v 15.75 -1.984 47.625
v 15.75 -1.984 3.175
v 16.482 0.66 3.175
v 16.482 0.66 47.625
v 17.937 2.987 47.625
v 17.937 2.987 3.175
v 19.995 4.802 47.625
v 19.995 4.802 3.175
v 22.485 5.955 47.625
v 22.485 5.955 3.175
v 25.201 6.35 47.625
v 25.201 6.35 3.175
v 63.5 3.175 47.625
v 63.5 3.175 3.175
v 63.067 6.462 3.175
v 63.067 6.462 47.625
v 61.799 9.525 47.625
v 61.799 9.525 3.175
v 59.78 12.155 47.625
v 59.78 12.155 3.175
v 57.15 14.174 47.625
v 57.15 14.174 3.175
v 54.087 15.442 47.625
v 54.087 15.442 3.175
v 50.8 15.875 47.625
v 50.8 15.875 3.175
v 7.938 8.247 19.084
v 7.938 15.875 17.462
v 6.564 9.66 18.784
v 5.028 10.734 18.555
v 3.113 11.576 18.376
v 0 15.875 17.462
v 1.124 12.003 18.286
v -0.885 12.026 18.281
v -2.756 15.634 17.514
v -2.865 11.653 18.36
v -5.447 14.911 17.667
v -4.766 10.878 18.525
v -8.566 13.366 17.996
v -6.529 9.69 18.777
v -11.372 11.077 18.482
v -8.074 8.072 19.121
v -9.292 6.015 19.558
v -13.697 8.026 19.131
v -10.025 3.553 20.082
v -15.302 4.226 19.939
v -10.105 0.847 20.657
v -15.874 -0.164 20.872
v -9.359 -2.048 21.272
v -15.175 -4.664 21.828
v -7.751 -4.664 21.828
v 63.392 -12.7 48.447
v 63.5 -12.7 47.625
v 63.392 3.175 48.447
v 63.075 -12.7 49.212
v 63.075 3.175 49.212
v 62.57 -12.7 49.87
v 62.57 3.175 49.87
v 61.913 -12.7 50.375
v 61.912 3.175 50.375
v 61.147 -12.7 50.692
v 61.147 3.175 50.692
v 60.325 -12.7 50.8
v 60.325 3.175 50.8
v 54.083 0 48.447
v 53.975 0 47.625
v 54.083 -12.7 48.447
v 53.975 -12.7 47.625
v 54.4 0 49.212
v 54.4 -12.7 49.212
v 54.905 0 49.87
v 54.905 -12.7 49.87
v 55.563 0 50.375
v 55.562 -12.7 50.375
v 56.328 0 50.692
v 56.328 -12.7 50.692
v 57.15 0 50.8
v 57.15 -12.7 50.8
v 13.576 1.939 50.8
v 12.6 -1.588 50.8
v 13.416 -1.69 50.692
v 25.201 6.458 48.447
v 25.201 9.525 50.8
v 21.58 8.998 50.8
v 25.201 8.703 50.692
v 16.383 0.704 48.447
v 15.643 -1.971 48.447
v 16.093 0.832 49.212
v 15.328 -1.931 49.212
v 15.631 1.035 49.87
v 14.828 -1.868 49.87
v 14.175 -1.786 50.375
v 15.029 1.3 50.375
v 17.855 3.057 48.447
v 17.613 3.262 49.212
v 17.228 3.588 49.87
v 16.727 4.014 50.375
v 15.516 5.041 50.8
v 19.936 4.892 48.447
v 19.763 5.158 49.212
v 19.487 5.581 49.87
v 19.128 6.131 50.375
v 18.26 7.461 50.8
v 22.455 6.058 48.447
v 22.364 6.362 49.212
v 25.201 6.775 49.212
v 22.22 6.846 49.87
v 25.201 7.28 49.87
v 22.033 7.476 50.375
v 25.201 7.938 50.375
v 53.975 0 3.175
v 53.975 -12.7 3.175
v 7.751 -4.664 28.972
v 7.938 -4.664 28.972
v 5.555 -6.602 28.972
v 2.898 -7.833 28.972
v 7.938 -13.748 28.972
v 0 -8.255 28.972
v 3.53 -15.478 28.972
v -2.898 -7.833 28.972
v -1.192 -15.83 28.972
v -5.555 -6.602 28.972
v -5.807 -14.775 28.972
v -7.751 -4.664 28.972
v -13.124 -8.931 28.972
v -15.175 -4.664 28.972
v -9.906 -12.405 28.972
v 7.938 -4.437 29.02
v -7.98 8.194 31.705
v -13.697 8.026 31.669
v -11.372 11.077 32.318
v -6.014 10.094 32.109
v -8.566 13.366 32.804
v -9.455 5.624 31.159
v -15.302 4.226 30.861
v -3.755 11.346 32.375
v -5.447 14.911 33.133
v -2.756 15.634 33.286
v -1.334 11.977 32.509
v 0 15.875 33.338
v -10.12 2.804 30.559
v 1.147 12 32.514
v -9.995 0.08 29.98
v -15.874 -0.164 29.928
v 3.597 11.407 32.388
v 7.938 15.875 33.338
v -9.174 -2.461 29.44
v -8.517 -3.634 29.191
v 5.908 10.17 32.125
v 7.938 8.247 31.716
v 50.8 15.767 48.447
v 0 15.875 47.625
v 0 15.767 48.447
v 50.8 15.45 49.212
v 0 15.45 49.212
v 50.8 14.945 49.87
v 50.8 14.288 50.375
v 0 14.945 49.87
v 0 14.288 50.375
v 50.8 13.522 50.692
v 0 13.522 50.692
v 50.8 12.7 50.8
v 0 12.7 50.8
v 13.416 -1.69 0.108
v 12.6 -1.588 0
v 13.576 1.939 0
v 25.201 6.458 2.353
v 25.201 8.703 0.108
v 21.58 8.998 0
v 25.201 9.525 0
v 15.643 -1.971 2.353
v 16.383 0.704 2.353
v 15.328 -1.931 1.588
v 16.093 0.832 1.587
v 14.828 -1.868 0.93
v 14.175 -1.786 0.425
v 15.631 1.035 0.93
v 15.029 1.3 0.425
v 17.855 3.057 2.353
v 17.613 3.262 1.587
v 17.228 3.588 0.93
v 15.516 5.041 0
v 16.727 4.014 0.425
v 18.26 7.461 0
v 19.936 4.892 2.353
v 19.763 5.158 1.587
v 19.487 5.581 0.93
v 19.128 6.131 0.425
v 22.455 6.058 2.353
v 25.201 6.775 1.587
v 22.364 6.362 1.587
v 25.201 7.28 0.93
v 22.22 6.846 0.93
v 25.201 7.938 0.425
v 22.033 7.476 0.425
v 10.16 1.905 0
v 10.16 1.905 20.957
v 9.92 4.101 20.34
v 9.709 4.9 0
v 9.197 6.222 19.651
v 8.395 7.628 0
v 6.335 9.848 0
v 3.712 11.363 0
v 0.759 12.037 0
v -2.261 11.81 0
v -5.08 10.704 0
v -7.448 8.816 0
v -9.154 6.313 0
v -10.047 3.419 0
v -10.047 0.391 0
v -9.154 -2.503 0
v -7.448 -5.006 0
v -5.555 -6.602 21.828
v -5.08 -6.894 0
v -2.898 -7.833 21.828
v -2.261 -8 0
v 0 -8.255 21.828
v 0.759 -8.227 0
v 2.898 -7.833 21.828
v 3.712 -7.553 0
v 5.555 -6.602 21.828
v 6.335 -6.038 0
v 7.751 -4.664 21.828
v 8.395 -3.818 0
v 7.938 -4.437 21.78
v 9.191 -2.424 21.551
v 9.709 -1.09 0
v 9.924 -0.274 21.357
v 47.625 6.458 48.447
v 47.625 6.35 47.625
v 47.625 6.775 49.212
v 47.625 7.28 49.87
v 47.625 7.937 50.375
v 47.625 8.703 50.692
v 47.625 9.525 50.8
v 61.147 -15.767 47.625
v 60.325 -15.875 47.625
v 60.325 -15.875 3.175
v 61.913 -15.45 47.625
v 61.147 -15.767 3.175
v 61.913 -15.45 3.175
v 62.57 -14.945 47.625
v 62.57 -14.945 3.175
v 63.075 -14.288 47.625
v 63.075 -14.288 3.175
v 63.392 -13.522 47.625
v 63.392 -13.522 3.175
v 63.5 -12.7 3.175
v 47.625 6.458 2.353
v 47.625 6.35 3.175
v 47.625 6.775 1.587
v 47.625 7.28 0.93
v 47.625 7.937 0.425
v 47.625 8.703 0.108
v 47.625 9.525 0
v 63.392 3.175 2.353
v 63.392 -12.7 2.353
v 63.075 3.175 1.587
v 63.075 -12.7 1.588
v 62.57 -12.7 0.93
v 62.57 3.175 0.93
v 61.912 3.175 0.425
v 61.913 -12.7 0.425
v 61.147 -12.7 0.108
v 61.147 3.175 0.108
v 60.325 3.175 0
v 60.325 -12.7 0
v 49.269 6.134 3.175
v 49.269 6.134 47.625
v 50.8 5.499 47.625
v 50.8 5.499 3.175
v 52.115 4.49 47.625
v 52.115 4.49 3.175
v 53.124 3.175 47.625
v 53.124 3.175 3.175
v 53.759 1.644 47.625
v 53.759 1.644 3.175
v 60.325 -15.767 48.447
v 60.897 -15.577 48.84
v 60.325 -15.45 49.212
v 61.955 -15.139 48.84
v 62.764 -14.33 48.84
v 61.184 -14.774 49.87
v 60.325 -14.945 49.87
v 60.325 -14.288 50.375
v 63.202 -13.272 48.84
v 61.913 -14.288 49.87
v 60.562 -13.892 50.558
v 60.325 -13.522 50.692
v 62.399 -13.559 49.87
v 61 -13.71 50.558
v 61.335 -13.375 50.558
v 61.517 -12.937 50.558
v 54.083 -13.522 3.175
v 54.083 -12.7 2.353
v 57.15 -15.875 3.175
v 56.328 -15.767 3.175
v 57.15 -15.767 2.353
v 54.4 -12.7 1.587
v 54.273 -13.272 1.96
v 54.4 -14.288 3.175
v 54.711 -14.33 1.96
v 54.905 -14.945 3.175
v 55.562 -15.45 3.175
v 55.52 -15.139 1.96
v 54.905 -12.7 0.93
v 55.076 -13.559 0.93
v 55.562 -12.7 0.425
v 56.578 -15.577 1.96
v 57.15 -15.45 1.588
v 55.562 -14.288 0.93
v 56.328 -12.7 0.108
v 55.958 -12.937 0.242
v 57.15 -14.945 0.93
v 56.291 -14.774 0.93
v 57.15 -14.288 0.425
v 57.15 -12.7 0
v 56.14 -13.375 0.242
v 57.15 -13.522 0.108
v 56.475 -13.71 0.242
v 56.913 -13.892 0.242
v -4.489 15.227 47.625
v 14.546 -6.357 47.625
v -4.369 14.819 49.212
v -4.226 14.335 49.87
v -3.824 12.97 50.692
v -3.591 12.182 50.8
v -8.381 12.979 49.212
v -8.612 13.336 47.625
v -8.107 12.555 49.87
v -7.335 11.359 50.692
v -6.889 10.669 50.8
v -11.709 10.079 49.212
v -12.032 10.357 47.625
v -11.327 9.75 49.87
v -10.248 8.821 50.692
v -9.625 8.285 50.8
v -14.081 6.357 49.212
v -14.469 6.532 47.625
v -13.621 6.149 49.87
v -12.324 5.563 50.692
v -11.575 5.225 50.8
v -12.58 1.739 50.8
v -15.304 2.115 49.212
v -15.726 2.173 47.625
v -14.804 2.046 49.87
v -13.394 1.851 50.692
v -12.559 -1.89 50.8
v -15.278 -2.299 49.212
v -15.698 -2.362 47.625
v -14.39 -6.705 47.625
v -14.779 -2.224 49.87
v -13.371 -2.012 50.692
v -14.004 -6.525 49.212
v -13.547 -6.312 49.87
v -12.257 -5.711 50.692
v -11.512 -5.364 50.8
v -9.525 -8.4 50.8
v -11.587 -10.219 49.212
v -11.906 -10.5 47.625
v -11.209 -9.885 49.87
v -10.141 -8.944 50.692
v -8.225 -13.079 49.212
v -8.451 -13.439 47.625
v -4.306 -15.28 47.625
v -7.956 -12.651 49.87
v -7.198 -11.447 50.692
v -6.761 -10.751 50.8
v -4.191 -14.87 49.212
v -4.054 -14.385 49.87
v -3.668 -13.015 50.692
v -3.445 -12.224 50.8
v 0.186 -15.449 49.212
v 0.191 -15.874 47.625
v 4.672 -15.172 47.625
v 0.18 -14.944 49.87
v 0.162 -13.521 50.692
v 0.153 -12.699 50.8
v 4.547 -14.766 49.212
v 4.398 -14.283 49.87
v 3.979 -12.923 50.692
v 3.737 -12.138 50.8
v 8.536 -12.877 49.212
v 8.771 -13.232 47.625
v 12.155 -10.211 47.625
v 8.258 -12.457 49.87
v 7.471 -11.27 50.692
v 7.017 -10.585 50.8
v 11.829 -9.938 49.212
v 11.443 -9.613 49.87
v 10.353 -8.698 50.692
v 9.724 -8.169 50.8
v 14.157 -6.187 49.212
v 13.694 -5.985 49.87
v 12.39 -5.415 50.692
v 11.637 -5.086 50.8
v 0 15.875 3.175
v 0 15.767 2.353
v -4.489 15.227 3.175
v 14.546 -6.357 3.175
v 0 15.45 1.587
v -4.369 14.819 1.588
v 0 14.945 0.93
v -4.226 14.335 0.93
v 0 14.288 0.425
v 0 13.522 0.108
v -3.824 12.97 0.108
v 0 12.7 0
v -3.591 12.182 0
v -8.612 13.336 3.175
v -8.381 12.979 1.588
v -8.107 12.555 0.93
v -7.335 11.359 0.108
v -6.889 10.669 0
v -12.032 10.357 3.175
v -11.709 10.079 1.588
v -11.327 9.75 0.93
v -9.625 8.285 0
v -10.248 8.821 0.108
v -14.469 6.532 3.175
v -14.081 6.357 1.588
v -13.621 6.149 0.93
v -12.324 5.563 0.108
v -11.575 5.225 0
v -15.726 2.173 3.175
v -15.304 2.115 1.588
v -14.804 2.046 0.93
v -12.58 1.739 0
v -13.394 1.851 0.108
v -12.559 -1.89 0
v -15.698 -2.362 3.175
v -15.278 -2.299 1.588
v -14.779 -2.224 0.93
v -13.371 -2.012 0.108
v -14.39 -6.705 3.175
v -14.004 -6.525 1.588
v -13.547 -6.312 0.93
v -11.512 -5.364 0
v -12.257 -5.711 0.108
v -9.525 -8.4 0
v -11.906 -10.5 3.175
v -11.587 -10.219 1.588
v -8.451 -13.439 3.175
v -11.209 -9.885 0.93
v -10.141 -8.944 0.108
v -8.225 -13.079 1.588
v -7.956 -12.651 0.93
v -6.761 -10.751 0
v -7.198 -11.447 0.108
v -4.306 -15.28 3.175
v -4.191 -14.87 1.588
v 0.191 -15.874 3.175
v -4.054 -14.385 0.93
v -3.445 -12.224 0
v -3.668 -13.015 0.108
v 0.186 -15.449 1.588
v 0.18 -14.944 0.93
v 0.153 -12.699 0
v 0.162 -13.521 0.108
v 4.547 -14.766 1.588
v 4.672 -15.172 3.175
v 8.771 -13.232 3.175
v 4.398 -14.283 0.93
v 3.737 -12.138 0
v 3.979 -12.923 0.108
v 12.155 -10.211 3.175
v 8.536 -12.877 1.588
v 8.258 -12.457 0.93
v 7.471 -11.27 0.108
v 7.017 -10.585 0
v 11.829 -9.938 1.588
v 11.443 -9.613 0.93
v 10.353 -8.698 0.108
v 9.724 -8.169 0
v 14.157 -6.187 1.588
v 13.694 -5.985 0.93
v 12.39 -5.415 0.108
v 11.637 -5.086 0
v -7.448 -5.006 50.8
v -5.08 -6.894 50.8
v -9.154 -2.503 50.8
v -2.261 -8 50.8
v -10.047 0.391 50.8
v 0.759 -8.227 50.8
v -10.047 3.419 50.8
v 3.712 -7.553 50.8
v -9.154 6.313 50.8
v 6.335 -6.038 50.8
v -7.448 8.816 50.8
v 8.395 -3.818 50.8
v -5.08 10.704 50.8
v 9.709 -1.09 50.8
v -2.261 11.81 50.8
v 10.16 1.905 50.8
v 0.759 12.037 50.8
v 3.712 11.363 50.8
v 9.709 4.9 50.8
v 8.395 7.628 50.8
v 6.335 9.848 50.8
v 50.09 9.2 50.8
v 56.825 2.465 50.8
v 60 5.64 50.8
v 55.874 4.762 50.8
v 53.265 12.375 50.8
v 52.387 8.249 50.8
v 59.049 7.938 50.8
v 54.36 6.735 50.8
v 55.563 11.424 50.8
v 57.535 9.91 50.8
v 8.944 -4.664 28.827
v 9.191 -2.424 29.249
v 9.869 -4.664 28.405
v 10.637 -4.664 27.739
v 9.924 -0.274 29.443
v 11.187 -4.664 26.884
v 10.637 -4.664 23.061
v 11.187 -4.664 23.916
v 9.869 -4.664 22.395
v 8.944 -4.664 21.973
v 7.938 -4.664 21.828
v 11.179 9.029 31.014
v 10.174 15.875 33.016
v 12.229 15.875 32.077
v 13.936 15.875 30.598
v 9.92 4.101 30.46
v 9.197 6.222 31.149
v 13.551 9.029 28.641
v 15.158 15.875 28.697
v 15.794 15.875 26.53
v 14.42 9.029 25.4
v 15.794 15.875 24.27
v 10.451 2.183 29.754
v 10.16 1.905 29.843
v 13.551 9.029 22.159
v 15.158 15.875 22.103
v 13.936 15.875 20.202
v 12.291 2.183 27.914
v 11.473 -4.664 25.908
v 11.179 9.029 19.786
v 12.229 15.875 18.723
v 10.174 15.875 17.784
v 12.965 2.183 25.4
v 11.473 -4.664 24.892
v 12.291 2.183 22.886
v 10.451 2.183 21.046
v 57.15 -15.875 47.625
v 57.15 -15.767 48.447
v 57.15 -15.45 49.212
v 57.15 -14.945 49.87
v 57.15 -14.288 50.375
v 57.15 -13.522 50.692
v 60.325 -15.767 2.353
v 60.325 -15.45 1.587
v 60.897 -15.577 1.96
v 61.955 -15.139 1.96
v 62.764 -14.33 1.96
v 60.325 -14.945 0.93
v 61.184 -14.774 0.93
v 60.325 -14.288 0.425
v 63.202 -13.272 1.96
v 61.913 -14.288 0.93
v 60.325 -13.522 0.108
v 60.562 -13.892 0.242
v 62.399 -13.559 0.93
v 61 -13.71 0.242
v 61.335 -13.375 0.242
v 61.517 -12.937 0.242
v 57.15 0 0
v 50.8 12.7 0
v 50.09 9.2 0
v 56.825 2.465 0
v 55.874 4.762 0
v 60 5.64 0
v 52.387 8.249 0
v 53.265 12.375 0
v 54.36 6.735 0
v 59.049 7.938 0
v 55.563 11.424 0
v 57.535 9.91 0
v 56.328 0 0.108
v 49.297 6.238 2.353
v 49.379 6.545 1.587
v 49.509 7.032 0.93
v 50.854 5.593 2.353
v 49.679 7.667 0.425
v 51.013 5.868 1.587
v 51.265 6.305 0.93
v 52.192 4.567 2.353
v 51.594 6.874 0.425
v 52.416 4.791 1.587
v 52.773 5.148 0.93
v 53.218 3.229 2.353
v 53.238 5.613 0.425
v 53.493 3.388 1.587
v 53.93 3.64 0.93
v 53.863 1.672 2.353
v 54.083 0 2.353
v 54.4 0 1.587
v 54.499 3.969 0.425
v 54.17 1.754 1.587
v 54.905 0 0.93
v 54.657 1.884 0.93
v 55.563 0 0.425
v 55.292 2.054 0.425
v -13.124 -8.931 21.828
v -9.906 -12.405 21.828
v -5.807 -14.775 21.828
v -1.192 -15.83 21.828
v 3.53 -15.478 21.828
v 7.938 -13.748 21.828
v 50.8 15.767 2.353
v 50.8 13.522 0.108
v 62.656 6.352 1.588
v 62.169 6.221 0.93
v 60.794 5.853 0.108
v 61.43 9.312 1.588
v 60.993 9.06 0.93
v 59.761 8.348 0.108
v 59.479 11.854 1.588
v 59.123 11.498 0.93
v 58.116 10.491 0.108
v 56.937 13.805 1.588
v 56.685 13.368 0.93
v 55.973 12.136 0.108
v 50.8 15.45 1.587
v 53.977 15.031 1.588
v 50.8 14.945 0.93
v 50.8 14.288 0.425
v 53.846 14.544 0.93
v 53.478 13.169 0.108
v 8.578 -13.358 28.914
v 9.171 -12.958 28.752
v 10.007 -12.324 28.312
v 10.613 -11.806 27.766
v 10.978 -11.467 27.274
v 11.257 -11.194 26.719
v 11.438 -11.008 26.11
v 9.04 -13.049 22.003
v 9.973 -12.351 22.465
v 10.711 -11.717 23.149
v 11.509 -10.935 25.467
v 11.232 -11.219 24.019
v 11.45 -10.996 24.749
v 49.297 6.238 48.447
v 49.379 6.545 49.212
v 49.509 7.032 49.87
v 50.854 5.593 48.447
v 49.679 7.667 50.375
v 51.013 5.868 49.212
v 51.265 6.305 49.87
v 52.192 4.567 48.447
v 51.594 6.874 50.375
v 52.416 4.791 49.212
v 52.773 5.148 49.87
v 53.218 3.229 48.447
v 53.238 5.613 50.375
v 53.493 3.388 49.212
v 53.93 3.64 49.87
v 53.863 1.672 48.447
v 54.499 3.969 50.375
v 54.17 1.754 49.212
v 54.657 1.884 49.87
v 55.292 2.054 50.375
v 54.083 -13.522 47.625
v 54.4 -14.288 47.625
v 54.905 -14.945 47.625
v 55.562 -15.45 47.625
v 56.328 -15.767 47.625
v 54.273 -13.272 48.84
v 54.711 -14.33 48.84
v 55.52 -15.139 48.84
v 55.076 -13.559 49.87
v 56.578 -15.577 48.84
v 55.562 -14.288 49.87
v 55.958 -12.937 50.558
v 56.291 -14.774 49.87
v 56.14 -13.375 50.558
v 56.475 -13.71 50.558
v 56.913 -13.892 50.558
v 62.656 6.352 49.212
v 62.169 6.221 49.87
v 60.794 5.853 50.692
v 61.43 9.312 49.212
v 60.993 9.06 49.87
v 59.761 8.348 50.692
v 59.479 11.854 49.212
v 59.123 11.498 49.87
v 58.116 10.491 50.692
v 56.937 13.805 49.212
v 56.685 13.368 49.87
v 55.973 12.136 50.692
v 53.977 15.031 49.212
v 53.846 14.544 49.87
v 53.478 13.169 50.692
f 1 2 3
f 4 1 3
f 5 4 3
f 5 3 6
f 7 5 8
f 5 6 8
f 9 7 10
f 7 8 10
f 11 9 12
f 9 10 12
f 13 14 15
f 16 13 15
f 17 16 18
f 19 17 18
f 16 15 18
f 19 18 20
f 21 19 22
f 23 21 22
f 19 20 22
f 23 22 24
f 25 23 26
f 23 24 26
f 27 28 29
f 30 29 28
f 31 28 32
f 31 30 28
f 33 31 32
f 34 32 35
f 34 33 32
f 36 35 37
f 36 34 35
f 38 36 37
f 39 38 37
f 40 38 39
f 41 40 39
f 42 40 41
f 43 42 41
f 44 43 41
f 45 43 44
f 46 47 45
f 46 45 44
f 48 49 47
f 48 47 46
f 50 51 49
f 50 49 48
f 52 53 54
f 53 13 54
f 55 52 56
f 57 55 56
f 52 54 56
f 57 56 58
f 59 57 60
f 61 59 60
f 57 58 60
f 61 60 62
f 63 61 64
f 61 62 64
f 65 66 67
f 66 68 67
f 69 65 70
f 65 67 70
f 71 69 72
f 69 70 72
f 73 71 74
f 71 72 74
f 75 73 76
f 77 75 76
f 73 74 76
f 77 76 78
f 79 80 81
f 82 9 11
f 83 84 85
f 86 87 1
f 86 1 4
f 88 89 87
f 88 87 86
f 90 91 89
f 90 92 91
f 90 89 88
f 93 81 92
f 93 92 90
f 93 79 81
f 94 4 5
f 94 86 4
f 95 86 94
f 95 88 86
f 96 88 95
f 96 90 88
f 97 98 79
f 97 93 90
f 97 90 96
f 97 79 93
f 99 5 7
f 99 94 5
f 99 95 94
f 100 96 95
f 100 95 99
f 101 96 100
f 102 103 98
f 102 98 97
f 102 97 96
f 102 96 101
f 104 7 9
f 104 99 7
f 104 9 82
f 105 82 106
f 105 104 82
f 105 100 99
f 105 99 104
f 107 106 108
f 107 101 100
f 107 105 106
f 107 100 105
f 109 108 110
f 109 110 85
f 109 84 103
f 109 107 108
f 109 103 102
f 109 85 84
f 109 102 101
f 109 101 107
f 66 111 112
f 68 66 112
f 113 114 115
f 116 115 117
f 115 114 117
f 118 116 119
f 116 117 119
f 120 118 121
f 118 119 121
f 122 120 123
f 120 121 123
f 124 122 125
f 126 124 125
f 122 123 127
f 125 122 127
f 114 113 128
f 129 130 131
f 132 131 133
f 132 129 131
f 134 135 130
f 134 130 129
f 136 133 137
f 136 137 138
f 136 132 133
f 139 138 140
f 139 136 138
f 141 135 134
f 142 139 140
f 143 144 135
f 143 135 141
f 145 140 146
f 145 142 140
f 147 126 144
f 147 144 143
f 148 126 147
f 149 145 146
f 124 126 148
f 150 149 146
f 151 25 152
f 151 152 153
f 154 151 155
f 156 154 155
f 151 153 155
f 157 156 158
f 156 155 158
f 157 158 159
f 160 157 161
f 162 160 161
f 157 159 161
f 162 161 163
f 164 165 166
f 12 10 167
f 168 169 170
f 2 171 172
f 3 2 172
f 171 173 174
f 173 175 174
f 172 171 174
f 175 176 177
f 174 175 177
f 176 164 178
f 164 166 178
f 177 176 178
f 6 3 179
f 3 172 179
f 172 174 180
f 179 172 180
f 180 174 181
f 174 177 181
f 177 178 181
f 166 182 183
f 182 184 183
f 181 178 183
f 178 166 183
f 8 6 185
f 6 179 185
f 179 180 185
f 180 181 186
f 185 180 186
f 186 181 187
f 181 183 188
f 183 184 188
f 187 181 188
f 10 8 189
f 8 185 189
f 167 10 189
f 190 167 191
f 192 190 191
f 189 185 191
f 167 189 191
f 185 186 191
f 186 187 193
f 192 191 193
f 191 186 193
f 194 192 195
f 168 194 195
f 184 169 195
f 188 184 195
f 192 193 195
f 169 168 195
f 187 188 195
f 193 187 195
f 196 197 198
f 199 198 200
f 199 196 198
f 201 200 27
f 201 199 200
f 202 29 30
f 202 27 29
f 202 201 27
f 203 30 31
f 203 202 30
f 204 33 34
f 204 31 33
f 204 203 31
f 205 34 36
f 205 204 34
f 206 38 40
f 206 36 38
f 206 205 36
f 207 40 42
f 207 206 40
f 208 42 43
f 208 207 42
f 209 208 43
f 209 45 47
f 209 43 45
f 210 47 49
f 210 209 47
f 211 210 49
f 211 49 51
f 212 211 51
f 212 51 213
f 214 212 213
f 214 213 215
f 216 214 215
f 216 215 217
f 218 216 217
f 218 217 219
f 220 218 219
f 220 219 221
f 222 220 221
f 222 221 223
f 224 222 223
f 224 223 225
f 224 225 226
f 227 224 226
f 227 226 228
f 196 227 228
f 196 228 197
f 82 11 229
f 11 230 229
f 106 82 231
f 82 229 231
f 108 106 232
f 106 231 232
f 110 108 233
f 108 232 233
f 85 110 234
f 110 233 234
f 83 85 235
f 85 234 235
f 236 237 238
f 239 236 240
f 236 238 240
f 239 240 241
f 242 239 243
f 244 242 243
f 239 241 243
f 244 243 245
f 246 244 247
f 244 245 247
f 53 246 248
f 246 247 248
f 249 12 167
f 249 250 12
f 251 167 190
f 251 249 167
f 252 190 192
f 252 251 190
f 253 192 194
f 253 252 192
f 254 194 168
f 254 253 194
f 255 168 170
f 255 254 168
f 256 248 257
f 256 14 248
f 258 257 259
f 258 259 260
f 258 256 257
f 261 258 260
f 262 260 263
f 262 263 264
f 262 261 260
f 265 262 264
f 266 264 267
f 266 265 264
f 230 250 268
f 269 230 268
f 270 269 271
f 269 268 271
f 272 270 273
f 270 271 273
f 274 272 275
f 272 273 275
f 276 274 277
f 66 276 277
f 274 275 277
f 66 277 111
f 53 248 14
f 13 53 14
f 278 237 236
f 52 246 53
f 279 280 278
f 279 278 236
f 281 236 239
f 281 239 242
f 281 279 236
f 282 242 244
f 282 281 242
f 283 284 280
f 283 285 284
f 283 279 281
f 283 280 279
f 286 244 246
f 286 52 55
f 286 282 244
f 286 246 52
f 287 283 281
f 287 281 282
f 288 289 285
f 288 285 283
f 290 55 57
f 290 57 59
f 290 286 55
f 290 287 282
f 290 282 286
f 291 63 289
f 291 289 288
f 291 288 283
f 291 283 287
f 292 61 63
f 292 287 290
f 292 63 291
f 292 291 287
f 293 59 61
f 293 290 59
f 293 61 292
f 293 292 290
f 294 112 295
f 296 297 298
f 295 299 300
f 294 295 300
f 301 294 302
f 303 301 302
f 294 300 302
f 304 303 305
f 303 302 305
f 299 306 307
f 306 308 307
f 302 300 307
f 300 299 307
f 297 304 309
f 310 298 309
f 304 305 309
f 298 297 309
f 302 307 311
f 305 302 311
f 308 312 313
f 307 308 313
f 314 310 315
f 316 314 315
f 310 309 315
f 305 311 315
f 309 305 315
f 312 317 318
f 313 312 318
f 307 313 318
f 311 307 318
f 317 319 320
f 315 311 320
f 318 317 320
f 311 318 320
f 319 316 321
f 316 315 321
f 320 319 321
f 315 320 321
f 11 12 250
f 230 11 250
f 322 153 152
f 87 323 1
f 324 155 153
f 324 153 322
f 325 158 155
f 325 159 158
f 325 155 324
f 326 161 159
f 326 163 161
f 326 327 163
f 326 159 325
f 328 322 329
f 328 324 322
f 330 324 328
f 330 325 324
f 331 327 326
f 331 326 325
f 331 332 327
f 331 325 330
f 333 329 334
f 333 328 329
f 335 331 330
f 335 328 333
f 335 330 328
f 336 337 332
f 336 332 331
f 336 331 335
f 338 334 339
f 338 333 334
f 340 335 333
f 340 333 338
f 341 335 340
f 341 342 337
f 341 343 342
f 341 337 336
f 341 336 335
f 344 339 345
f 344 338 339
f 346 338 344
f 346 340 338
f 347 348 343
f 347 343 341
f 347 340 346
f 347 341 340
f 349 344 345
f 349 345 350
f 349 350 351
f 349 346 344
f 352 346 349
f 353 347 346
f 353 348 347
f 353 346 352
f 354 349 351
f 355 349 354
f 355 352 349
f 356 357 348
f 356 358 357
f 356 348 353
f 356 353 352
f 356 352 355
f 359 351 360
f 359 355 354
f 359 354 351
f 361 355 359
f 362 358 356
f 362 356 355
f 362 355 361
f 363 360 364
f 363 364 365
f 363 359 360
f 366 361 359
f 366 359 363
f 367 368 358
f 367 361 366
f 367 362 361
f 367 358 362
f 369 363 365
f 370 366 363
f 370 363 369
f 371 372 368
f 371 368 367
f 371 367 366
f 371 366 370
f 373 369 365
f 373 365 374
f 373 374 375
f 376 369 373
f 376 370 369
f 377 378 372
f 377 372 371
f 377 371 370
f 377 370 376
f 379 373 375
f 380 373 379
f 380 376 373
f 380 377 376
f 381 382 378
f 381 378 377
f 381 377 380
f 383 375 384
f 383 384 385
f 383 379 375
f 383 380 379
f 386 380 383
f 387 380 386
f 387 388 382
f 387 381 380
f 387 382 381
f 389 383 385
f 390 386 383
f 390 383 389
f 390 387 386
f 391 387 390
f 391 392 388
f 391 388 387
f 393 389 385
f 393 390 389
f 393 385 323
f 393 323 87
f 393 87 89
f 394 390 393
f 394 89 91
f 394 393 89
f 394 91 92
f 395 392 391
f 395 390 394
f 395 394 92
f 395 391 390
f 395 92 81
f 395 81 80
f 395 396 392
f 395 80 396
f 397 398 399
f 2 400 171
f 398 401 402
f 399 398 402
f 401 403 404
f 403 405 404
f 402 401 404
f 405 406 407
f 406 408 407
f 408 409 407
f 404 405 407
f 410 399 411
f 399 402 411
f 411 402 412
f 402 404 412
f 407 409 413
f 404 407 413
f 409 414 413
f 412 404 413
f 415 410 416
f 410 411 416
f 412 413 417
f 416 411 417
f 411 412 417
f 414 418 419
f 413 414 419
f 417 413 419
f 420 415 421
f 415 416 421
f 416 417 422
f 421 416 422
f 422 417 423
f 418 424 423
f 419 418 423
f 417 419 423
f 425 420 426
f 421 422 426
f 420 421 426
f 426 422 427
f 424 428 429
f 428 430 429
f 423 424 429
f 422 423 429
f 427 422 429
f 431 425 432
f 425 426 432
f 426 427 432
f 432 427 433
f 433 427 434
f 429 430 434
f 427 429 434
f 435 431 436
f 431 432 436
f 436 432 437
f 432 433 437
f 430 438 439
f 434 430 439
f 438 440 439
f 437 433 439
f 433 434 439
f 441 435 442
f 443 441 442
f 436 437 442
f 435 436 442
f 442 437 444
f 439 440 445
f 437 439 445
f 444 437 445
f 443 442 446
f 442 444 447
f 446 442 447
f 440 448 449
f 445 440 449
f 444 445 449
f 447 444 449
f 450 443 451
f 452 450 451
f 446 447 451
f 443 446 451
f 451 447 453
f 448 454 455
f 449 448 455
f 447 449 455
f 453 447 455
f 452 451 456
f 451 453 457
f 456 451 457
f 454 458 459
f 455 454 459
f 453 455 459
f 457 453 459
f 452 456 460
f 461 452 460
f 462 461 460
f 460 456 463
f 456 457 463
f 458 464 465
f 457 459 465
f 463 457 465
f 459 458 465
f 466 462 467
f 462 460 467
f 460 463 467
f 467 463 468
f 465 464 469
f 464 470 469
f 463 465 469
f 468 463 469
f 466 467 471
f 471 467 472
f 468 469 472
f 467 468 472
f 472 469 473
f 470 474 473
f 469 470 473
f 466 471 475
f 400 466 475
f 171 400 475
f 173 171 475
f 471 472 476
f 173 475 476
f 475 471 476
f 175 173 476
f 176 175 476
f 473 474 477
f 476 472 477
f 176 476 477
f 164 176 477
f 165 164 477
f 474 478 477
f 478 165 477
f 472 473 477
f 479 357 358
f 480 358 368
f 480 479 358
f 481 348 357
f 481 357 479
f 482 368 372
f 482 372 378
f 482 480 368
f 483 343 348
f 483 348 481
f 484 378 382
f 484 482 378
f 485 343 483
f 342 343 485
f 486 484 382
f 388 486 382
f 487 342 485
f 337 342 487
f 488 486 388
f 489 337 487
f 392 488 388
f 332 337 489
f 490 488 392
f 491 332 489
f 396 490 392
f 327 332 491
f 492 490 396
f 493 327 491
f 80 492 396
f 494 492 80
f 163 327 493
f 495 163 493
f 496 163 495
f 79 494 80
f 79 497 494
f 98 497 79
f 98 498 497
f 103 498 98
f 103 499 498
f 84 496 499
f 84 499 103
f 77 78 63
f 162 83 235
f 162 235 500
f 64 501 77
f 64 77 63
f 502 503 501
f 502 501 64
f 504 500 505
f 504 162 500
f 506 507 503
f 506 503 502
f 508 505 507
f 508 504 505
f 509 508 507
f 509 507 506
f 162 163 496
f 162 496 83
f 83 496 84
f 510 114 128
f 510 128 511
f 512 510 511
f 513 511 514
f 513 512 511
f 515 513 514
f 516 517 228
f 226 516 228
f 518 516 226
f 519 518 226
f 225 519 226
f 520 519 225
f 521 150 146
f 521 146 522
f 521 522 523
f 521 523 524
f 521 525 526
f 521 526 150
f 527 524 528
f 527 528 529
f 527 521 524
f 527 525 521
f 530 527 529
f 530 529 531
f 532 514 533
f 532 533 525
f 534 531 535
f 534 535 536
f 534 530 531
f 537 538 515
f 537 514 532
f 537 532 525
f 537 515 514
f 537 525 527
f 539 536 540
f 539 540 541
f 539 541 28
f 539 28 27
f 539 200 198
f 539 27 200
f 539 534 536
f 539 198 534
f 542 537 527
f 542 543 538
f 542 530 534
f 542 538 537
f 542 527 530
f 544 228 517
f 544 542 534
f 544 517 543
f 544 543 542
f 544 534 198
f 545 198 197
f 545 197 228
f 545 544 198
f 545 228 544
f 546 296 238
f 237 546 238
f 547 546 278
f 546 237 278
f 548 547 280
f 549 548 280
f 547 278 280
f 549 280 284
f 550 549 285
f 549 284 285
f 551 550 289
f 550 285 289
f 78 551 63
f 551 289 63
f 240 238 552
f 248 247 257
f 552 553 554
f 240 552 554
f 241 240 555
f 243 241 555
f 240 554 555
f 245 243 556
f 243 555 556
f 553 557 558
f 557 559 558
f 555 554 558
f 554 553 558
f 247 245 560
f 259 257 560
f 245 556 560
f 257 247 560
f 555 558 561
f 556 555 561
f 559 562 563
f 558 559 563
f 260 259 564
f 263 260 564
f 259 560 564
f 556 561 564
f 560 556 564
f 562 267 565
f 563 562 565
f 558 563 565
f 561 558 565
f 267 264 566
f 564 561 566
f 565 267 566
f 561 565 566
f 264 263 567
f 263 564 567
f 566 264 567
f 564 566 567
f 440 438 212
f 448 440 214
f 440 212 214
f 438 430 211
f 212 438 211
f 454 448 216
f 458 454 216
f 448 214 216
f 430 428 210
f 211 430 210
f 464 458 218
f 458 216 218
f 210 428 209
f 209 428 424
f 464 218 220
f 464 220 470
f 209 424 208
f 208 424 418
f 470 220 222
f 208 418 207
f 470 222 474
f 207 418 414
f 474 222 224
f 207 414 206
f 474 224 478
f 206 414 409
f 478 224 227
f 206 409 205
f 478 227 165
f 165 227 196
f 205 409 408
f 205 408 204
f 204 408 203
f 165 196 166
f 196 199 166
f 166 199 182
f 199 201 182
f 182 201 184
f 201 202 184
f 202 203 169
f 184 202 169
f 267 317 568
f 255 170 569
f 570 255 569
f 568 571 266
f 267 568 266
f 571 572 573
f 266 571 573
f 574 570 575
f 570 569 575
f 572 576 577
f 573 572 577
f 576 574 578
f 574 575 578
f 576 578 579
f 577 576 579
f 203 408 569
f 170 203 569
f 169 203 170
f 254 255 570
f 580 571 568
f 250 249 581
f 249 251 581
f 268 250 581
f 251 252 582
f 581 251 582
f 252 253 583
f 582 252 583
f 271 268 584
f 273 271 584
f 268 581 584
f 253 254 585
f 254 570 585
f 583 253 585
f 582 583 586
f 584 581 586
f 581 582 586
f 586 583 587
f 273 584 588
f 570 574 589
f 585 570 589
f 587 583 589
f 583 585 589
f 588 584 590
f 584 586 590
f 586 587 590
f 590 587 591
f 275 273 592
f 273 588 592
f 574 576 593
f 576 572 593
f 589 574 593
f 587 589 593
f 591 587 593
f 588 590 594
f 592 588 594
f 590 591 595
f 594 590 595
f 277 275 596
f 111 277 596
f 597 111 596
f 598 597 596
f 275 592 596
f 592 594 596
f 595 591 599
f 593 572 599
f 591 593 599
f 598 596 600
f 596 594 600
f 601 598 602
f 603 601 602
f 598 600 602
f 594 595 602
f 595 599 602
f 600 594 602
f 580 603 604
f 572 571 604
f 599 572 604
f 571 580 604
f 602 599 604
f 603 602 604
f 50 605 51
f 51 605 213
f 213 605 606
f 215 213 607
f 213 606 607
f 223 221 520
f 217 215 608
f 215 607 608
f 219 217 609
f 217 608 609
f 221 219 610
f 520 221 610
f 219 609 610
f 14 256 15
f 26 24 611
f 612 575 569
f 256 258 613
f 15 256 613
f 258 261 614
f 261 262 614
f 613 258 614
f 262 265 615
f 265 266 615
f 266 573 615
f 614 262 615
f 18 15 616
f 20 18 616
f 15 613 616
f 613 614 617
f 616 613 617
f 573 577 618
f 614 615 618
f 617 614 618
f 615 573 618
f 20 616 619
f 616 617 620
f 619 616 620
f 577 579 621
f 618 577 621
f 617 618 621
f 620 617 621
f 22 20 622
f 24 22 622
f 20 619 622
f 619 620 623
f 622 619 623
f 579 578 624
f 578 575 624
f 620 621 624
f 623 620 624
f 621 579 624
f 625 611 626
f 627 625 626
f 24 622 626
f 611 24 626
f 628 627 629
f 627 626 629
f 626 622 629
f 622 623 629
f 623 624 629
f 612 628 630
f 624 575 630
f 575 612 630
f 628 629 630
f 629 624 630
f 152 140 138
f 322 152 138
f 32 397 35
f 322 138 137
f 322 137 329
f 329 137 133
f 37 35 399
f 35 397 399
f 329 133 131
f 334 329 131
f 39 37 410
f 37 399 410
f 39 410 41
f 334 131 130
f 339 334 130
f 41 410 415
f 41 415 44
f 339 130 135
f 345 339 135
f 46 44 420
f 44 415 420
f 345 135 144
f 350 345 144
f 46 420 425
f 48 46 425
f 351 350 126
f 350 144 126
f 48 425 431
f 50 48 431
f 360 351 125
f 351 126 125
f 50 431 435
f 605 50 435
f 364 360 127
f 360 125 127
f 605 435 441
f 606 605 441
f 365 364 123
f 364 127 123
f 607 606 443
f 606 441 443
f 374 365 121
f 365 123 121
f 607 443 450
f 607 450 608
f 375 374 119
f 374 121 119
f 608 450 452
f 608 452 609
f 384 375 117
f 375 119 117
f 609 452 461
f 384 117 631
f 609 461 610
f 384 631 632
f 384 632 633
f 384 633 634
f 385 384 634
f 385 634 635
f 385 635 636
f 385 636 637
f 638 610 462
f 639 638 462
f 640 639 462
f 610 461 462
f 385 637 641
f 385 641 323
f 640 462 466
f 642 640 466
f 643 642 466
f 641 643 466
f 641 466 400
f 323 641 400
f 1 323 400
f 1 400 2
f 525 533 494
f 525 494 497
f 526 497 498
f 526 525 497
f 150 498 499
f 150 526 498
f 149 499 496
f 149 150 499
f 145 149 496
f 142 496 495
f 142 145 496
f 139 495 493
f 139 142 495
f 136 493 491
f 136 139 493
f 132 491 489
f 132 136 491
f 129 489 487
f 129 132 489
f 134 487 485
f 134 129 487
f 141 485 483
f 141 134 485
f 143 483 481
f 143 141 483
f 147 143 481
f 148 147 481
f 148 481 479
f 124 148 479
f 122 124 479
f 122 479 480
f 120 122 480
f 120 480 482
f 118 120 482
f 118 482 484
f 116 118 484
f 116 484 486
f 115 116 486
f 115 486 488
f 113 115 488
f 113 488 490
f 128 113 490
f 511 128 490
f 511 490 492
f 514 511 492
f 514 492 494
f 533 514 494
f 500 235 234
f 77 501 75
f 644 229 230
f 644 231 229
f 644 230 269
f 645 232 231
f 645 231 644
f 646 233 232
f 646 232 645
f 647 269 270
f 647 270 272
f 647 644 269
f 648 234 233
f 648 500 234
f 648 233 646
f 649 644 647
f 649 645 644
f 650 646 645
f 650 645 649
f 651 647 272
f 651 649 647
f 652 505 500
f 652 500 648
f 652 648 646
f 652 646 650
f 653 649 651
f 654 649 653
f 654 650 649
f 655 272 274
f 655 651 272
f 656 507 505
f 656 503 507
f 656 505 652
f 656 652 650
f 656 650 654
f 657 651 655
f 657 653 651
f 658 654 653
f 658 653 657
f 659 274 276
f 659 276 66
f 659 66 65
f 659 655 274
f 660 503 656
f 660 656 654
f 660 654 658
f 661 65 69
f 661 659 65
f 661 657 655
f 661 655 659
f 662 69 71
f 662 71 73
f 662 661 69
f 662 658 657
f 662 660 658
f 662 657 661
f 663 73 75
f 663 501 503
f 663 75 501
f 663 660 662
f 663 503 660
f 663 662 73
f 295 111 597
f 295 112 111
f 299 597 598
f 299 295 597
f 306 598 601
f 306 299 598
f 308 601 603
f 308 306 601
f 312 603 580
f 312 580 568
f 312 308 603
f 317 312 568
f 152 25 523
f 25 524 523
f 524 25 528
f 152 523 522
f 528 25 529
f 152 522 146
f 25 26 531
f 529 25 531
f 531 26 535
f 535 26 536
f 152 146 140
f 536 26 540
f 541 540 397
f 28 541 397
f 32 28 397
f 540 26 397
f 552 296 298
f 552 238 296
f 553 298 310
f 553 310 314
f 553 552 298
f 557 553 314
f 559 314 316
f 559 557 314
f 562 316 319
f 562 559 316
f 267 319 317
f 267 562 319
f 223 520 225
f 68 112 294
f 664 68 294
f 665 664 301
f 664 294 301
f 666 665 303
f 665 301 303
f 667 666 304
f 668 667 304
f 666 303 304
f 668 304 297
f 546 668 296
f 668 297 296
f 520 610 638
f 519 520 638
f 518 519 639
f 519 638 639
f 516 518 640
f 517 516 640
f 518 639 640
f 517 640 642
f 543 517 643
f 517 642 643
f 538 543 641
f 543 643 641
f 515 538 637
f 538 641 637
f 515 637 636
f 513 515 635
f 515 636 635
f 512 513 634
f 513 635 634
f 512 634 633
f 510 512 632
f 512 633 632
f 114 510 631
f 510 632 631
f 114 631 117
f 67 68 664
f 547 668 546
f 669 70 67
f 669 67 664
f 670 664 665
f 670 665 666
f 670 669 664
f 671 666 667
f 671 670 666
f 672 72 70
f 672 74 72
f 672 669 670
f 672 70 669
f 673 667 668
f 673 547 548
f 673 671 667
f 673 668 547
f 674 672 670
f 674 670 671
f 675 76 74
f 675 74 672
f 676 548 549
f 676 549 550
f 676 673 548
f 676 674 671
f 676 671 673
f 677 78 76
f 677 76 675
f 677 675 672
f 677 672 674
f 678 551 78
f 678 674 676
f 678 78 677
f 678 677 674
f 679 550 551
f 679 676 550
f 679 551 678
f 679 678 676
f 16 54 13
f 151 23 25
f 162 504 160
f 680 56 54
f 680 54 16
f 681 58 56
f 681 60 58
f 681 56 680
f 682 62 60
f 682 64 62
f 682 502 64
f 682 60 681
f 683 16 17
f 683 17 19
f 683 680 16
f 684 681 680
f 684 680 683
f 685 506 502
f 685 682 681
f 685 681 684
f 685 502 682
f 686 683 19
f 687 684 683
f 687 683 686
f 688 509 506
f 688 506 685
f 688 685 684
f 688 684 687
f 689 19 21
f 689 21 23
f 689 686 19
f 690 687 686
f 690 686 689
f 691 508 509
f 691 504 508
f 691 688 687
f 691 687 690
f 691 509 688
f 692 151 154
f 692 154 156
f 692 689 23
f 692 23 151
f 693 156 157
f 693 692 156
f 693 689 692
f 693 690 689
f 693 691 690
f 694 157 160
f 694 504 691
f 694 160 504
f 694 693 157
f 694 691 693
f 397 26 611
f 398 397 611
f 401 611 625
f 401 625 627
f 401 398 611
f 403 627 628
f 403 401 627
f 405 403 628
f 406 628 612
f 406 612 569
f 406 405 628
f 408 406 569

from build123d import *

# Parameters (mm, degrees)
F0_R     = 10.16
F1_DEPTH = 50.8
F3_R     = 3.175
F2_W     = 38.1
F2_H     = 15.875
F5_DEPTH = 31.751
F5_TAPER = 12
F6_DEPTH = 25.4


with BuildPart() as f1:
    # F0 (on Top) → F1 (new body)
    with BuildSketch(Plane.XY):
        with BuildLine():
            ThreePointArc((0, 15.875), (11.2253201513, 11.2253201513), (15.875, 0))
            ThreePointArc((15.875, 0), (15.8438414877, -0.9941387788), (15.7504882631, -1.9843750839))
            ThreePointArc((15.7504882631, -1.9843750839), (18.9005858967, 3.968749972), (25.2007812379, 6.35))
            Line((25.2007812379, 6.35), (47.625, 6.35))
            ThreePointArc((47.625, 6.35), (52.1151280605, 4.4901280605), (53.975, 0))
            Line((53.975, 0), (53.975, -12.7))
            ThreePointArc((53.975, -12.7), (54.9049359697, -14.9450640303), (57.15, -15.875))
            Line((57.15, -15.875), (60.325, -15.875))
            ThreePointArc((60.325, -15.875), (62.5700640303, -14.9450640303), (63.5, -12.7))
            Line((63.5, -12.7), (63.5, 3.175))
            ThreePointArc((63.5, 3.175), (59.7802561211, 12.1552561211), (50.8, 15.875))
            Line((50.8, 15.875), (0, 15.875))
        make_face()
        with BuildLine():
            ThreePointArc((15.7504882631, -1.9843750839), (15.8438414877, -0.9941387788), (15.875, 0))
            ThreePointArc((15.875, 0), (11.2253201513, 11.2253201513), (0, 15.875))
            ThreePointArc((0, 15.875), (-11.906250028, -10.5003254841), (15.7504882631, -1.9843750839))
        make_face()
        with Locations((0, 1.905)):
            Circle(F0_R, mode=Mode.SUBTRACT)
    extrude(amount=F1_DEPTH)

    # F3
    f3_edges = [f1.edges().sort_by_distance(p)[0] for p in [
        (25.4, 15.875, 0),
        (25.4, 15.875, 50.8),
    ]]
    fillet(f3_edges, radius=F3_R)

    # F2 (on face) → F5 (cut, through all)
    with BuildSketch(Plane(origin=(0, 15.875, 0), x_dir=(-1, 0, 0), z_dir=(0, 1, 0))):
        with BuildLine():
            ThreePointArc((-7.9375, 33.3375), (-15.875, 25.4), (-7.9375, 17.4625))
            Line((-7.9375, 17.4625), (0, 17.4625))
            Line((0, 17.4625), (0, 33.3375))
            Line((0, 33.3375), (-7.9375, 33.3375))
        make_face()
        with Locations((19.05, 25.4)):
            Rectangle(F2_W, F2_H)
    extrude(amount=-F5_DEPTH, taper=F5_TAPER, mode=Mode.SUBTRACT)

    # F4 (on face) → F6 (cut)
    with BuildSketch(Plane.XZ.offset(15.875)):
        with BuildLine():
            Line((-38.1, 21.828125), (7.9375, 21.828125))
            ThreePointArc((7.9375, 21.828125), (11.509375, 25.4), (7.9375, 28.971875))
            Line((7.9375, 28.971875), (-38.1, 28.971875))
            Line((-38.1, 28.971875), (-38.1, 21.828125))
        make_face()
    extrude(amount=-F6_DEPTH, mode=Mode.SUBTRACT)


solid = f1.part
